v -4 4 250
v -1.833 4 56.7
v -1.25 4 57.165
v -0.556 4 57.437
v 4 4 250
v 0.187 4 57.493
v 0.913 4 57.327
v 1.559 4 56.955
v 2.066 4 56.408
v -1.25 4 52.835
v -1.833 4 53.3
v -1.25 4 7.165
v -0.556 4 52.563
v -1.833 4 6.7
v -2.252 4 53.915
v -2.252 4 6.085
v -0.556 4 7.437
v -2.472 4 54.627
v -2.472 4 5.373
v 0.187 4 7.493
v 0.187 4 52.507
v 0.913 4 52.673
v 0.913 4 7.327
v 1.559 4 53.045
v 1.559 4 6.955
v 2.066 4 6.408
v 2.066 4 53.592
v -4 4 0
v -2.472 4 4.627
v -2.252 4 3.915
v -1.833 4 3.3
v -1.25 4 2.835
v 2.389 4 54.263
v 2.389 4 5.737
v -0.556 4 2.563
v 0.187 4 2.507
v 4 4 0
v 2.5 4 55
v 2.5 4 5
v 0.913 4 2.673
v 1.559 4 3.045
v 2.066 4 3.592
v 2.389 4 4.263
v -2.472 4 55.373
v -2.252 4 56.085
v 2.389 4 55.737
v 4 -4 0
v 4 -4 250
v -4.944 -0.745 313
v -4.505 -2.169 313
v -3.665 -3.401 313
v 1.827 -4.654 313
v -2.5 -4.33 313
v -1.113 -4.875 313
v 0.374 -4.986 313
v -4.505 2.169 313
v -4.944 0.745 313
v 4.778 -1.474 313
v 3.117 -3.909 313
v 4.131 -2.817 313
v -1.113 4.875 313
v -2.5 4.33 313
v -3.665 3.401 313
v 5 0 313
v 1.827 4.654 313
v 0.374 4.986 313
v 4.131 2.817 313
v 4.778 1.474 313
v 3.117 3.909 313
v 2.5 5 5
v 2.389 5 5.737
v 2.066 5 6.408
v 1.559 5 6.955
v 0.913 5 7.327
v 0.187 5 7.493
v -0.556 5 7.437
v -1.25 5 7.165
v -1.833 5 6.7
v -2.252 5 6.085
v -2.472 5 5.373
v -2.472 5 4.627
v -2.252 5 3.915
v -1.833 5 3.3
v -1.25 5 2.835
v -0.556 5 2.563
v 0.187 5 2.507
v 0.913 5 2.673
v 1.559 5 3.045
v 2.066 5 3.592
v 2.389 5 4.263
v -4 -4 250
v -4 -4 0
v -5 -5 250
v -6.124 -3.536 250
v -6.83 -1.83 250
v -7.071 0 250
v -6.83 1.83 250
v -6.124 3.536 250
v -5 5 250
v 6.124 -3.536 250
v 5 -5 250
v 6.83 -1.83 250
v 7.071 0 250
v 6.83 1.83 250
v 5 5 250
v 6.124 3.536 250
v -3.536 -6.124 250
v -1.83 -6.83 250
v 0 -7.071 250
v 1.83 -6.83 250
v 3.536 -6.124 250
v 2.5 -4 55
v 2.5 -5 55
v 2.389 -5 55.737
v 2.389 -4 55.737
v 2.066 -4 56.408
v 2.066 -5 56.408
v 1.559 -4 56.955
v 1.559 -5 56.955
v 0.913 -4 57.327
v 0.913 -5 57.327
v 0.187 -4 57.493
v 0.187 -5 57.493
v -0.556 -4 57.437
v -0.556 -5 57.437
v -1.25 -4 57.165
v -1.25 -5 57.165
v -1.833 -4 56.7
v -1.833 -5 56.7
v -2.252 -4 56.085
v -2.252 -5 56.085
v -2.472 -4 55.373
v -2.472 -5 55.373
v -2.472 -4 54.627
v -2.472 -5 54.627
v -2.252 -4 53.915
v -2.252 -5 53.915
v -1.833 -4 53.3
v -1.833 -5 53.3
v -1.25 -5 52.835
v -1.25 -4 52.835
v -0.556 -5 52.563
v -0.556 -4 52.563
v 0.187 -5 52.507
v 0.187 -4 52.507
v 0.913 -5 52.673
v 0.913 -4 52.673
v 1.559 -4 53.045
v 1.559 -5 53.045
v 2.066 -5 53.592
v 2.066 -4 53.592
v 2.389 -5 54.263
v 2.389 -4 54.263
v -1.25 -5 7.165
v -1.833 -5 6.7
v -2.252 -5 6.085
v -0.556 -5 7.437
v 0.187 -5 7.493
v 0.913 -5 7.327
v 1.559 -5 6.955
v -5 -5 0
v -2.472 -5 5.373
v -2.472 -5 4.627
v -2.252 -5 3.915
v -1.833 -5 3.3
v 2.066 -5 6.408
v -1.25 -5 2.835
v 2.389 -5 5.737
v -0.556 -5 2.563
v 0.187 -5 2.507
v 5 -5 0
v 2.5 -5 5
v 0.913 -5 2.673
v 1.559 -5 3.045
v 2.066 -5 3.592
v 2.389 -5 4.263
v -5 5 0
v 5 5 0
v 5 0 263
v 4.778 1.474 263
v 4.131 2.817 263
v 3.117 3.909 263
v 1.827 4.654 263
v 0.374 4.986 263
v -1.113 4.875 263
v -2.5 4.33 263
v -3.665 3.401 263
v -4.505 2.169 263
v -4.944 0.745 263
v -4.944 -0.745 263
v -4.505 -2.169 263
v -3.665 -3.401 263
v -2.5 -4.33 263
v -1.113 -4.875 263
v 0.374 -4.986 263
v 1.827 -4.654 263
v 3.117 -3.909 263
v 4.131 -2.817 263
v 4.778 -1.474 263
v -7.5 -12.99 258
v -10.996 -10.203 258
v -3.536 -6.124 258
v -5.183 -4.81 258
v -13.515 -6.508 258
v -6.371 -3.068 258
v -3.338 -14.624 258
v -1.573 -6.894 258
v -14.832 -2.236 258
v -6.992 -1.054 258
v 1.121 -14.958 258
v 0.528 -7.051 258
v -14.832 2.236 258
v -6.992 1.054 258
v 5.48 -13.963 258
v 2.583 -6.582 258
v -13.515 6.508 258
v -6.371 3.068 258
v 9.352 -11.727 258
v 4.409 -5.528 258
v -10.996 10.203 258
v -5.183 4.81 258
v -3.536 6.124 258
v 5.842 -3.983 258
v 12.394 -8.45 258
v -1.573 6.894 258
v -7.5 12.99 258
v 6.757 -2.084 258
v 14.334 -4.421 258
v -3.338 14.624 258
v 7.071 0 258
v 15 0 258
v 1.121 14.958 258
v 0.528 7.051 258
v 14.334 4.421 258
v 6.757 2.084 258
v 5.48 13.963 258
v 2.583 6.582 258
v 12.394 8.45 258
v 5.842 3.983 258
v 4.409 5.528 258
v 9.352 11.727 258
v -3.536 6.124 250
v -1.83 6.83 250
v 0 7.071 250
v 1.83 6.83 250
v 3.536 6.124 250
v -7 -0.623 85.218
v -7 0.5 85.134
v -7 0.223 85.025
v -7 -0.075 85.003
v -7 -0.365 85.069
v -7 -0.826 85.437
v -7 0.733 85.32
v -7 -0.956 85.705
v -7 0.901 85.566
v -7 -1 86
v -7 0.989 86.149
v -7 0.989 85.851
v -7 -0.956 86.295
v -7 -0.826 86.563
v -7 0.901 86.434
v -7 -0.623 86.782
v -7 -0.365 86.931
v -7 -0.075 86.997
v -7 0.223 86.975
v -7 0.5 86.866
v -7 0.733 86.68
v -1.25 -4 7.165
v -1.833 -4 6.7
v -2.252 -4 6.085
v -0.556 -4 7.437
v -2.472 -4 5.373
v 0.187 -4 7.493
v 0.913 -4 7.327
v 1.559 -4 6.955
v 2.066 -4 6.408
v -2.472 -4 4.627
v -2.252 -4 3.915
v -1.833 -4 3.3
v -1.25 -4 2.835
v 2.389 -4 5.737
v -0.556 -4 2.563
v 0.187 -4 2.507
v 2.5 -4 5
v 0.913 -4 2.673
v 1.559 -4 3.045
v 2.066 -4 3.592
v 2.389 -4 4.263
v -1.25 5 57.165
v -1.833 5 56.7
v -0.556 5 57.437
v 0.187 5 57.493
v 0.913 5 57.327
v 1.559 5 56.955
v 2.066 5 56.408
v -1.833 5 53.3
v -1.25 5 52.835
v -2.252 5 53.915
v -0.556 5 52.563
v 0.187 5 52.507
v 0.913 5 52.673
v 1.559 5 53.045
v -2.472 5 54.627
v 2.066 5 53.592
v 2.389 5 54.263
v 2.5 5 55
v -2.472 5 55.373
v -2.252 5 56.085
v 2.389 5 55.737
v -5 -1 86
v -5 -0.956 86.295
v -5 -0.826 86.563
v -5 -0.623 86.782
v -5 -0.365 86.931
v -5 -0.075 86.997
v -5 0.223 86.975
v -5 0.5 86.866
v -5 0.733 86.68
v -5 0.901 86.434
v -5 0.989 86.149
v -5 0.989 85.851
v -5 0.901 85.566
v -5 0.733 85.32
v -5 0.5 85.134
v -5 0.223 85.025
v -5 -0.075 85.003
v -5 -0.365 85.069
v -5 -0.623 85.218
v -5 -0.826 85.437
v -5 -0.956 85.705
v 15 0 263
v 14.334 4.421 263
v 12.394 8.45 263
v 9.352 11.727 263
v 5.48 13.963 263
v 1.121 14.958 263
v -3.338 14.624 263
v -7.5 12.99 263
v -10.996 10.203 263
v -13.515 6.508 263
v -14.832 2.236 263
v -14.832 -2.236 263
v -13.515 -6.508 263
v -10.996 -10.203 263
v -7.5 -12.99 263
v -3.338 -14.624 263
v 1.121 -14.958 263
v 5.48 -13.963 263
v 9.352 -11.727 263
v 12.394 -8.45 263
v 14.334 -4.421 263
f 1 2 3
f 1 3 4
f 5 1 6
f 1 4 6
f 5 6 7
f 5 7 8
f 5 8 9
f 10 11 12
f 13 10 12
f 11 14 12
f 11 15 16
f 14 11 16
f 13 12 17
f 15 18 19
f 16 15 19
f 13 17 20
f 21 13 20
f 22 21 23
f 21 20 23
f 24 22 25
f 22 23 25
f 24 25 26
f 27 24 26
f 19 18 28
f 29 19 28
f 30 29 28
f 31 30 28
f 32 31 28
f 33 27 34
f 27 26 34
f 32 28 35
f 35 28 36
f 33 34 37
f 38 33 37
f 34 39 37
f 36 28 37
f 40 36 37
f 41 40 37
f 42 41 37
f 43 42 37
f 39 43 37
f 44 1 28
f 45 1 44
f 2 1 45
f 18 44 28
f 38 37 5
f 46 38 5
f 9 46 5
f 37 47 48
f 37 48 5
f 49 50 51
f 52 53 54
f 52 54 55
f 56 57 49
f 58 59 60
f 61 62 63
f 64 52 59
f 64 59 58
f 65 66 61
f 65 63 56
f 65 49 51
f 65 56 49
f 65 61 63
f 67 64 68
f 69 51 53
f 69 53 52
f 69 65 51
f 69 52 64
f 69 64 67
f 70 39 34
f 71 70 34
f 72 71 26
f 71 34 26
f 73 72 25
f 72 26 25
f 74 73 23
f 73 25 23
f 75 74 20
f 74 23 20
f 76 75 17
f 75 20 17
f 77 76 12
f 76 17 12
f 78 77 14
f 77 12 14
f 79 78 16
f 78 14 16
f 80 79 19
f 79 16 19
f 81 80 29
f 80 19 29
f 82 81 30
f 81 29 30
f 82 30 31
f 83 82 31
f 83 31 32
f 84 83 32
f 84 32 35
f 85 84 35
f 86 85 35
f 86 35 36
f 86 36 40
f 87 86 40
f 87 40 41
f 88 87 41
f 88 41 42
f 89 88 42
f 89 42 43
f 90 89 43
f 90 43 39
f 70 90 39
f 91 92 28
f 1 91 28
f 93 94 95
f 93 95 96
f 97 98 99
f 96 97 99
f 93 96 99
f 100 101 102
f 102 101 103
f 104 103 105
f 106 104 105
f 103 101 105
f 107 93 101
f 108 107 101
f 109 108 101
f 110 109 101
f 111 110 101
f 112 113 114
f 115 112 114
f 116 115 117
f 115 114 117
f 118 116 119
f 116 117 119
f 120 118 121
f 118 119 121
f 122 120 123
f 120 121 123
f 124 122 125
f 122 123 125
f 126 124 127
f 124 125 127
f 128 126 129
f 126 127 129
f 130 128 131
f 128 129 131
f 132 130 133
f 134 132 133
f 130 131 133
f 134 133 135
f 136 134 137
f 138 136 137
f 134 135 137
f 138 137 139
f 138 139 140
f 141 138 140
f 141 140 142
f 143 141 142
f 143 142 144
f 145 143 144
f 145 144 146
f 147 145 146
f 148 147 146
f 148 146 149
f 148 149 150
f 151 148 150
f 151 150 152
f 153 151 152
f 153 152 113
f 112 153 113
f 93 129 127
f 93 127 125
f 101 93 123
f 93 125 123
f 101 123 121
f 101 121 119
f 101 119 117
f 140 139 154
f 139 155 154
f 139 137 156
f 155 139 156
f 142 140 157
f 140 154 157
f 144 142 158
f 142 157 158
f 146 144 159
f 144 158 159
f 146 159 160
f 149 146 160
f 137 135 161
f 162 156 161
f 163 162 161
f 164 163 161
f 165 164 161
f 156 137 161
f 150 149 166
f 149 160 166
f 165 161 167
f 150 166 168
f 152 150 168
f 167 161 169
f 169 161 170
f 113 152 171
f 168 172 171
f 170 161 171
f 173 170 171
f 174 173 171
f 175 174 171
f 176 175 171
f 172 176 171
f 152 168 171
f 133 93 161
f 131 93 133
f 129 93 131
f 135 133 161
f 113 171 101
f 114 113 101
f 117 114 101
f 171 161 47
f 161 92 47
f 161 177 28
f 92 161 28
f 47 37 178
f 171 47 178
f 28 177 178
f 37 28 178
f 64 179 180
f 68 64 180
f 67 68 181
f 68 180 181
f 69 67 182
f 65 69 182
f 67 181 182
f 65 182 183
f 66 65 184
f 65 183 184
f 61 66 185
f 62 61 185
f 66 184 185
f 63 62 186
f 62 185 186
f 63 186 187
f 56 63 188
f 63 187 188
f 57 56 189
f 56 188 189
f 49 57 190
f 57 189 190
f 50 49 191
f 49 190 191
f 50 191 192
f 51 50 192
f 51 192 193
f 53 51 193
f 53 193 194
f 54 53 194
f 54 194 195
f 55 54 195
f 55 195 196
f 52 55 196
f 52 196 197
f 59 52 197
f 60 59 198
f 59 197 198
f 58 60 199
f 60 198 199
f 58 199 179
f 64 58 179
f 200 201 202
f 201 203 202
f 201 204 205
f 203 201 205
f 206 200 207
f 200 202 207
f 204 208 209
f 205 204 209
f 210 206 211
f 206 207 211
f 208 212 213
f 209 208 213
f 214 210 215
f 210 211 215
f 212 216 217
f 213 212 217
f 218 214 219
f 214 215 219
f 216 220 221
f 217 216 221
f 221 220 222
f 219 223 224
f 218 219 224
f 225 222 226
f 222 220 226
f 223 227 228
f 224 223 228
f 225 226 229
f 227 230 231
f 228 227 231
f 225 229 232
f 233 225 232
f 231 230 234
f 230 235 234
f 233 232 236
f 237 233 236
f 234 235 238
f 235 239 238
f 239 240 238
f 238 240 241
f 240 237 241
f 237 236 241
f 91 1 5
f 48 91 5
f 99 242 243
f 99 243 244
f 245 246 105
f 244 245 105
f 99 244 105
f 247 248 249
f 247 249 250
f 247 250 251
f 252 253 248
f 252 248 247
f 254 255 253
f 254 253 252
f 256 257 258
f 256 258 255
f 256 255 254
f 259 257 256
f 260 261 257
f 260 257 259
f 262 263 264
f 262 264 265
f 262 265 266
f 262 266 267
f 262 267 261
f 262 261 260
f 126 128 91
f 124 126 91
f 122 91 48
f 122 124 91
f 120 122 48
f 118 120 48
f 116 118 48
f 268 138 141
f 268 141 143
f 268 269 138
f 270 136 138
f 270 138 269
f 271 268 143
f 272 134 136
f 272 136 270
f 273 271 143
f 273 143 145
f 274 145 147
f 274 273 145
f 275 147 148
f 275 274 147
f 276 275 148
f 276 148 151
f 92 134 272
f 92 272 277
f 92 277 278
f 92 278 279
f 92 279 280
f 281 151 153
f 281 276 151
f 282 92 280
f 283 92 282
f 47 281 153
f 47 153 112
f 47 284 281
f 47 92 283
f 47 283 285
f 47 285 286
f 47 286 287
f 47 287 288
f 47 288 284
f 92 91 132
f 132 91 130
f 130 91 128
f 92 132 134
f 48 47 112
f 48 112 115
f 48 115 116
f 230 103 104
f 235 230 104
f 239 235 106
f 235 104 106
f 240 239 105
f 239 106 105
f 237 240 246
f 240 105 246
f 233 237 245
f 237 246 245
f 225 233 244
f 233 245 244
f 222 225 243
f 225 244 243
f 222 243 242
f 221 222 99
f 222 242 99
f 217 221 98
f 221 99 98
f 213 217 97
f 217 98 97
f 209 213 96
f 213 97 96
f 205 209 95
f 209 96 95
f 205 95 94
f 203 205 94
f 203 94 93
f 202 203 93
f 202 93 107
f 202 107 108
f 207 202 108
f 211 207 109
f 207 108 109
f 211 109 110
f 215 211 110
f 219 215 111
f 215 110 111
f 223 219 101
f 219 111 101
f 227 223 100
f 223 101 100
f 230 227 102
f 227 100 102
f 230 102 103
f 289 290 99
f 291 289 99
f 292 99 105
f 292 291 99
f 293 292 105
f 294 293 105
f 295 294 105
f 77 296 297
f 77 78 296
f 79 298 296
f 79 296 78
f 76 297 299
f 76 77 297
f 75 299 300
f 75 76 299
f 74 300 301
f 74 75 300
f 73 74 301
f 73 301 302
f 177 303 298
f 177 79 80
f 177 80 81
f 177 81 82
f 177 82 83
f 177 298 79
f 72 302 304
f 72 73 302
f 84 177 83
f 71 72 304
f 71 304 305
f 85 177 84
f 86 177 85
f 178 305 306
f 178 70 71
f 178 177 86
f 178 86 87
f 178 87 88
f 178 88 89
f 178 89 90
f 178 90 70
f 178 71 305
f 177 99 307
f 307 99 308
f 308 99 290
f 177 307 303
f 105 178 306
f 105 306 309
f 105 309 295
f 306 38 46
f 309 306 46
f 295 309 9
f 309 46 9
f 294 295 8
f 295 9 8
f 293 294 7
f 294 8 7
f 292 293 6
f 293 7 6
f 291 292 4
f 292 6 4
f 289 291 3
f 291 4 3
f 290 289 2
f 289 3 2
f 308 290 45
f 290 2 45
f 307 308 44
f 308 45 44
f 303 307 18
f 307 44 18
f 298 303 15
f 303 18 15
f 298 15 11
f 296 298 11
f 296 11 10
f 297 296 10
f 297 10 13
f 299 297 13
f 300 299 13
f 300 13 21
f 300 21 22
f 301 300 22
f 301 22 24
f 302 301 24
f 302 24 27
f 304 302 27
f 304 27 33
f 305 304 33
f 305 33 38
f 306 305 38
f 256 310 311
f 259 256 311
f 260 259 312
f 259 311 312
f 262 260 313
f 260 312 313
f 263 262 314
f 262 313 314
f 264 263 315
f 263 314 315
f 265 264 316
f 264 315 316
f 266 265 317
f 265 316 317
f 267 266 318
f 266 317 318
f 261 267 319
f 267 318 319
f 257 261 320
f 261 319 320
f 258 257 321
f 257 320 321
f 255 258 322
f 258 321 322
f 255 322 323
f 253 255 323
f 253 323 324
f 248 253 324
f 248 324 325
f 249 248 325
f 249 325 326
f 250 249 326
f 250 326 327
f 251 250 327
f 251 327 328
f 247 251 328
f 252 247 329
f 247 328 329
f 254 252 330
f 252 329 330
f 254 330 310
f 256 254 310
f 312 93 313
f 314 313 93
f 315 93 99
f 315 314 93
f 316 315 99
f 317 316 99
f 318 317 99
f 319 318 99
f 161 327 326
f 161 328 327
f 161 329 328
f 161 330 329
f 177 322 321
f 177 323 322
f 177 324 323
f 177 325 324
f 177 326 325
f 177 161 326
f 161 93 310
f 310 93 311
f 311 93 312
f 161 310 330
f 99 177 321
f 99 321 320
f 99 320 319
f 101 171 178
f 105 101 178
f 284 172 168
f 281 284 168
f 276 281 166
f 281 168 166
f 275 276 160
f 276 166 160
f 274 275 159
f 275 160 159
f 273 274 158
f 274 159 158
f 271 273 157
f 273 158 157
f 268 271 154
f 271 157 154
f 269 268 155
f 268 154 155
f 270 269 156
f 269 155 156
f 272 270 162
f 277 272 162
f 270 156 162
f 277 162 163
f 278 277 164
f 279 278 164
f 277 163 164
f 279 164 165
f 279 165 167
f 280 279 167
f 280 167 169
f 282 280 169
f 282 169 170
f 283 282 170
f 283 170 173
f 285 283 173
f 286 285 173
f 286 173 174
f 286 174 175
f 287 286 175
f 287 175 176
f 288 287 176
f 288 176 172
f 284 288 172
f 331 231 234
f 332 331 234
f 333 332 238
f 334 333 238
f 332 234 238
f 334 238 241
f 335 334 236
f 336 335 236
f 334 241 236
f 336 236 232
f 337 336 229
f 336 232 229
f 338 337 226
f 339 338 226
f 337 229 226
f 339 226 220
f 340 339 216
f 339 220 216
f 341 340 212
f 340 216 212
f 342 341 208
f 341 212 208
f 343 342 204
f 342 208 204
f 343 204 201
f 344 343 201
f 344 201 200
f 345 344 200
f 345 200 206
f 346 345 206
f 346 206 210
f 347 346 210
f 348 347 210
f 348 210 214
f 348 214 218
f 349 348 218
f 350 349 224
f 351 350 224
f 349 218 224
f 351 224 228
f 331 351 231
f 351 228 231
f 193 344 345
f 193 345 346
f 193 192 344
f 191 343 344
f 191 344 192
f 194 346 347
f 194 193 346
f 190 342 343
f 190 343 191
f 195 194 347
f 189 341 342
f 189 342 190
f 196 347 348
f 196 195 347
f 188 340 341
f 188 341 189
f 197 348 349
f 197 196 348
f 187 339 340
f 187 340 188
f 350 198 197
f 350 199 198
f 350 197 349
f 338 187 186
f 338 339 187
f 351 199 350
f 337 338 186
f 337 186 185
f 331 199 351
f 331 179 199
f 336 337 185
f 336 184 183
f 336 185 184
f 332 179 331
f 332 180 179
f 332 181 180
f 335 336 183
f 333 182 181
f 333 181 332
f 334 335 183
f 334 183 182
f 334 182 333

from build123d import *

# Parameters (mm, degrees)
SKETCH_W     = 10
SKETCH_H     = 10
SKETCH_W_2   = 8
SKETCH_H_2   = 8
PAD_DEPTH    = 250
SKETCH001_R  = 2.5
POCKET_DEPTH = 10.001
SKETCH002_R  = 1
PAD001_DEPTH = 2
SKETCH003_R  = 7.071068
PAD002_DEPTH = 8
SKETCH004_R  = 15
PAD003_DEPTH = 5
SKETCH005_R  = 5
PAD004_DEPTH = 50


with BuildPart() as part:
    # Sketch → Pad (new body)
    with BuildSketch(Plane.XY):
        Rectangle(SKETCH_W, SKETCH_H)
        Rectangle(SKETCH_W_2, SKETCH_H_2, mode=Mode.SUBTRACT)
    extrude(amount=PAD_DEPTH)

    # Sketch001 (on Face3 of Pad) → Pocket (cut, through all)
    with BuildSketch(Plane.XZ.offset(5)):
        with Locations((0, 5)):
            Circle(SKETCH001_R)
        with Locations((0, 55)):
            Circle(SKETCH001_R)
    extrude(amount=-POCKET_DEPTH, mode=Mode.SUBTRACT)

    # Sketch002 (on Face2 of Pocket) → Pad001 (join)
    with BuildSketch(Plane(origin=(-5, 0, 0), x_dir=(0, -1, 0), z_dir=(-1, 0, 0))):
        with Locations((0, 86)):
            Circle(SKETCH002_R)
    extrude(amount=PAD001_DEPTH)

    # Sketch003 (on Face4 of Pad001) → Pad002 (join)
    with BuildSketch(Plane.XY.offset(250)):
        Circle(SKETCH003_R)
    extrude(amount=PAD002_DEPTH)

    # Sketch004 (on Face6 of Pad002) → Pad003 (join)
    with BuildSketch(Plane.XY.offset(258)):
        Circle(SKETCH004_R)
    extrude(amount=PAD003_DEPTH)

    # Sketch005 (on Face3 of Pad003) → Pad004 (join)
    with BuildSketch(Plane.XY.offset(263)):
        Circle(SKETCH005_R)
    extrude(amount=PAD004_DEPTH)


solid = part.part
